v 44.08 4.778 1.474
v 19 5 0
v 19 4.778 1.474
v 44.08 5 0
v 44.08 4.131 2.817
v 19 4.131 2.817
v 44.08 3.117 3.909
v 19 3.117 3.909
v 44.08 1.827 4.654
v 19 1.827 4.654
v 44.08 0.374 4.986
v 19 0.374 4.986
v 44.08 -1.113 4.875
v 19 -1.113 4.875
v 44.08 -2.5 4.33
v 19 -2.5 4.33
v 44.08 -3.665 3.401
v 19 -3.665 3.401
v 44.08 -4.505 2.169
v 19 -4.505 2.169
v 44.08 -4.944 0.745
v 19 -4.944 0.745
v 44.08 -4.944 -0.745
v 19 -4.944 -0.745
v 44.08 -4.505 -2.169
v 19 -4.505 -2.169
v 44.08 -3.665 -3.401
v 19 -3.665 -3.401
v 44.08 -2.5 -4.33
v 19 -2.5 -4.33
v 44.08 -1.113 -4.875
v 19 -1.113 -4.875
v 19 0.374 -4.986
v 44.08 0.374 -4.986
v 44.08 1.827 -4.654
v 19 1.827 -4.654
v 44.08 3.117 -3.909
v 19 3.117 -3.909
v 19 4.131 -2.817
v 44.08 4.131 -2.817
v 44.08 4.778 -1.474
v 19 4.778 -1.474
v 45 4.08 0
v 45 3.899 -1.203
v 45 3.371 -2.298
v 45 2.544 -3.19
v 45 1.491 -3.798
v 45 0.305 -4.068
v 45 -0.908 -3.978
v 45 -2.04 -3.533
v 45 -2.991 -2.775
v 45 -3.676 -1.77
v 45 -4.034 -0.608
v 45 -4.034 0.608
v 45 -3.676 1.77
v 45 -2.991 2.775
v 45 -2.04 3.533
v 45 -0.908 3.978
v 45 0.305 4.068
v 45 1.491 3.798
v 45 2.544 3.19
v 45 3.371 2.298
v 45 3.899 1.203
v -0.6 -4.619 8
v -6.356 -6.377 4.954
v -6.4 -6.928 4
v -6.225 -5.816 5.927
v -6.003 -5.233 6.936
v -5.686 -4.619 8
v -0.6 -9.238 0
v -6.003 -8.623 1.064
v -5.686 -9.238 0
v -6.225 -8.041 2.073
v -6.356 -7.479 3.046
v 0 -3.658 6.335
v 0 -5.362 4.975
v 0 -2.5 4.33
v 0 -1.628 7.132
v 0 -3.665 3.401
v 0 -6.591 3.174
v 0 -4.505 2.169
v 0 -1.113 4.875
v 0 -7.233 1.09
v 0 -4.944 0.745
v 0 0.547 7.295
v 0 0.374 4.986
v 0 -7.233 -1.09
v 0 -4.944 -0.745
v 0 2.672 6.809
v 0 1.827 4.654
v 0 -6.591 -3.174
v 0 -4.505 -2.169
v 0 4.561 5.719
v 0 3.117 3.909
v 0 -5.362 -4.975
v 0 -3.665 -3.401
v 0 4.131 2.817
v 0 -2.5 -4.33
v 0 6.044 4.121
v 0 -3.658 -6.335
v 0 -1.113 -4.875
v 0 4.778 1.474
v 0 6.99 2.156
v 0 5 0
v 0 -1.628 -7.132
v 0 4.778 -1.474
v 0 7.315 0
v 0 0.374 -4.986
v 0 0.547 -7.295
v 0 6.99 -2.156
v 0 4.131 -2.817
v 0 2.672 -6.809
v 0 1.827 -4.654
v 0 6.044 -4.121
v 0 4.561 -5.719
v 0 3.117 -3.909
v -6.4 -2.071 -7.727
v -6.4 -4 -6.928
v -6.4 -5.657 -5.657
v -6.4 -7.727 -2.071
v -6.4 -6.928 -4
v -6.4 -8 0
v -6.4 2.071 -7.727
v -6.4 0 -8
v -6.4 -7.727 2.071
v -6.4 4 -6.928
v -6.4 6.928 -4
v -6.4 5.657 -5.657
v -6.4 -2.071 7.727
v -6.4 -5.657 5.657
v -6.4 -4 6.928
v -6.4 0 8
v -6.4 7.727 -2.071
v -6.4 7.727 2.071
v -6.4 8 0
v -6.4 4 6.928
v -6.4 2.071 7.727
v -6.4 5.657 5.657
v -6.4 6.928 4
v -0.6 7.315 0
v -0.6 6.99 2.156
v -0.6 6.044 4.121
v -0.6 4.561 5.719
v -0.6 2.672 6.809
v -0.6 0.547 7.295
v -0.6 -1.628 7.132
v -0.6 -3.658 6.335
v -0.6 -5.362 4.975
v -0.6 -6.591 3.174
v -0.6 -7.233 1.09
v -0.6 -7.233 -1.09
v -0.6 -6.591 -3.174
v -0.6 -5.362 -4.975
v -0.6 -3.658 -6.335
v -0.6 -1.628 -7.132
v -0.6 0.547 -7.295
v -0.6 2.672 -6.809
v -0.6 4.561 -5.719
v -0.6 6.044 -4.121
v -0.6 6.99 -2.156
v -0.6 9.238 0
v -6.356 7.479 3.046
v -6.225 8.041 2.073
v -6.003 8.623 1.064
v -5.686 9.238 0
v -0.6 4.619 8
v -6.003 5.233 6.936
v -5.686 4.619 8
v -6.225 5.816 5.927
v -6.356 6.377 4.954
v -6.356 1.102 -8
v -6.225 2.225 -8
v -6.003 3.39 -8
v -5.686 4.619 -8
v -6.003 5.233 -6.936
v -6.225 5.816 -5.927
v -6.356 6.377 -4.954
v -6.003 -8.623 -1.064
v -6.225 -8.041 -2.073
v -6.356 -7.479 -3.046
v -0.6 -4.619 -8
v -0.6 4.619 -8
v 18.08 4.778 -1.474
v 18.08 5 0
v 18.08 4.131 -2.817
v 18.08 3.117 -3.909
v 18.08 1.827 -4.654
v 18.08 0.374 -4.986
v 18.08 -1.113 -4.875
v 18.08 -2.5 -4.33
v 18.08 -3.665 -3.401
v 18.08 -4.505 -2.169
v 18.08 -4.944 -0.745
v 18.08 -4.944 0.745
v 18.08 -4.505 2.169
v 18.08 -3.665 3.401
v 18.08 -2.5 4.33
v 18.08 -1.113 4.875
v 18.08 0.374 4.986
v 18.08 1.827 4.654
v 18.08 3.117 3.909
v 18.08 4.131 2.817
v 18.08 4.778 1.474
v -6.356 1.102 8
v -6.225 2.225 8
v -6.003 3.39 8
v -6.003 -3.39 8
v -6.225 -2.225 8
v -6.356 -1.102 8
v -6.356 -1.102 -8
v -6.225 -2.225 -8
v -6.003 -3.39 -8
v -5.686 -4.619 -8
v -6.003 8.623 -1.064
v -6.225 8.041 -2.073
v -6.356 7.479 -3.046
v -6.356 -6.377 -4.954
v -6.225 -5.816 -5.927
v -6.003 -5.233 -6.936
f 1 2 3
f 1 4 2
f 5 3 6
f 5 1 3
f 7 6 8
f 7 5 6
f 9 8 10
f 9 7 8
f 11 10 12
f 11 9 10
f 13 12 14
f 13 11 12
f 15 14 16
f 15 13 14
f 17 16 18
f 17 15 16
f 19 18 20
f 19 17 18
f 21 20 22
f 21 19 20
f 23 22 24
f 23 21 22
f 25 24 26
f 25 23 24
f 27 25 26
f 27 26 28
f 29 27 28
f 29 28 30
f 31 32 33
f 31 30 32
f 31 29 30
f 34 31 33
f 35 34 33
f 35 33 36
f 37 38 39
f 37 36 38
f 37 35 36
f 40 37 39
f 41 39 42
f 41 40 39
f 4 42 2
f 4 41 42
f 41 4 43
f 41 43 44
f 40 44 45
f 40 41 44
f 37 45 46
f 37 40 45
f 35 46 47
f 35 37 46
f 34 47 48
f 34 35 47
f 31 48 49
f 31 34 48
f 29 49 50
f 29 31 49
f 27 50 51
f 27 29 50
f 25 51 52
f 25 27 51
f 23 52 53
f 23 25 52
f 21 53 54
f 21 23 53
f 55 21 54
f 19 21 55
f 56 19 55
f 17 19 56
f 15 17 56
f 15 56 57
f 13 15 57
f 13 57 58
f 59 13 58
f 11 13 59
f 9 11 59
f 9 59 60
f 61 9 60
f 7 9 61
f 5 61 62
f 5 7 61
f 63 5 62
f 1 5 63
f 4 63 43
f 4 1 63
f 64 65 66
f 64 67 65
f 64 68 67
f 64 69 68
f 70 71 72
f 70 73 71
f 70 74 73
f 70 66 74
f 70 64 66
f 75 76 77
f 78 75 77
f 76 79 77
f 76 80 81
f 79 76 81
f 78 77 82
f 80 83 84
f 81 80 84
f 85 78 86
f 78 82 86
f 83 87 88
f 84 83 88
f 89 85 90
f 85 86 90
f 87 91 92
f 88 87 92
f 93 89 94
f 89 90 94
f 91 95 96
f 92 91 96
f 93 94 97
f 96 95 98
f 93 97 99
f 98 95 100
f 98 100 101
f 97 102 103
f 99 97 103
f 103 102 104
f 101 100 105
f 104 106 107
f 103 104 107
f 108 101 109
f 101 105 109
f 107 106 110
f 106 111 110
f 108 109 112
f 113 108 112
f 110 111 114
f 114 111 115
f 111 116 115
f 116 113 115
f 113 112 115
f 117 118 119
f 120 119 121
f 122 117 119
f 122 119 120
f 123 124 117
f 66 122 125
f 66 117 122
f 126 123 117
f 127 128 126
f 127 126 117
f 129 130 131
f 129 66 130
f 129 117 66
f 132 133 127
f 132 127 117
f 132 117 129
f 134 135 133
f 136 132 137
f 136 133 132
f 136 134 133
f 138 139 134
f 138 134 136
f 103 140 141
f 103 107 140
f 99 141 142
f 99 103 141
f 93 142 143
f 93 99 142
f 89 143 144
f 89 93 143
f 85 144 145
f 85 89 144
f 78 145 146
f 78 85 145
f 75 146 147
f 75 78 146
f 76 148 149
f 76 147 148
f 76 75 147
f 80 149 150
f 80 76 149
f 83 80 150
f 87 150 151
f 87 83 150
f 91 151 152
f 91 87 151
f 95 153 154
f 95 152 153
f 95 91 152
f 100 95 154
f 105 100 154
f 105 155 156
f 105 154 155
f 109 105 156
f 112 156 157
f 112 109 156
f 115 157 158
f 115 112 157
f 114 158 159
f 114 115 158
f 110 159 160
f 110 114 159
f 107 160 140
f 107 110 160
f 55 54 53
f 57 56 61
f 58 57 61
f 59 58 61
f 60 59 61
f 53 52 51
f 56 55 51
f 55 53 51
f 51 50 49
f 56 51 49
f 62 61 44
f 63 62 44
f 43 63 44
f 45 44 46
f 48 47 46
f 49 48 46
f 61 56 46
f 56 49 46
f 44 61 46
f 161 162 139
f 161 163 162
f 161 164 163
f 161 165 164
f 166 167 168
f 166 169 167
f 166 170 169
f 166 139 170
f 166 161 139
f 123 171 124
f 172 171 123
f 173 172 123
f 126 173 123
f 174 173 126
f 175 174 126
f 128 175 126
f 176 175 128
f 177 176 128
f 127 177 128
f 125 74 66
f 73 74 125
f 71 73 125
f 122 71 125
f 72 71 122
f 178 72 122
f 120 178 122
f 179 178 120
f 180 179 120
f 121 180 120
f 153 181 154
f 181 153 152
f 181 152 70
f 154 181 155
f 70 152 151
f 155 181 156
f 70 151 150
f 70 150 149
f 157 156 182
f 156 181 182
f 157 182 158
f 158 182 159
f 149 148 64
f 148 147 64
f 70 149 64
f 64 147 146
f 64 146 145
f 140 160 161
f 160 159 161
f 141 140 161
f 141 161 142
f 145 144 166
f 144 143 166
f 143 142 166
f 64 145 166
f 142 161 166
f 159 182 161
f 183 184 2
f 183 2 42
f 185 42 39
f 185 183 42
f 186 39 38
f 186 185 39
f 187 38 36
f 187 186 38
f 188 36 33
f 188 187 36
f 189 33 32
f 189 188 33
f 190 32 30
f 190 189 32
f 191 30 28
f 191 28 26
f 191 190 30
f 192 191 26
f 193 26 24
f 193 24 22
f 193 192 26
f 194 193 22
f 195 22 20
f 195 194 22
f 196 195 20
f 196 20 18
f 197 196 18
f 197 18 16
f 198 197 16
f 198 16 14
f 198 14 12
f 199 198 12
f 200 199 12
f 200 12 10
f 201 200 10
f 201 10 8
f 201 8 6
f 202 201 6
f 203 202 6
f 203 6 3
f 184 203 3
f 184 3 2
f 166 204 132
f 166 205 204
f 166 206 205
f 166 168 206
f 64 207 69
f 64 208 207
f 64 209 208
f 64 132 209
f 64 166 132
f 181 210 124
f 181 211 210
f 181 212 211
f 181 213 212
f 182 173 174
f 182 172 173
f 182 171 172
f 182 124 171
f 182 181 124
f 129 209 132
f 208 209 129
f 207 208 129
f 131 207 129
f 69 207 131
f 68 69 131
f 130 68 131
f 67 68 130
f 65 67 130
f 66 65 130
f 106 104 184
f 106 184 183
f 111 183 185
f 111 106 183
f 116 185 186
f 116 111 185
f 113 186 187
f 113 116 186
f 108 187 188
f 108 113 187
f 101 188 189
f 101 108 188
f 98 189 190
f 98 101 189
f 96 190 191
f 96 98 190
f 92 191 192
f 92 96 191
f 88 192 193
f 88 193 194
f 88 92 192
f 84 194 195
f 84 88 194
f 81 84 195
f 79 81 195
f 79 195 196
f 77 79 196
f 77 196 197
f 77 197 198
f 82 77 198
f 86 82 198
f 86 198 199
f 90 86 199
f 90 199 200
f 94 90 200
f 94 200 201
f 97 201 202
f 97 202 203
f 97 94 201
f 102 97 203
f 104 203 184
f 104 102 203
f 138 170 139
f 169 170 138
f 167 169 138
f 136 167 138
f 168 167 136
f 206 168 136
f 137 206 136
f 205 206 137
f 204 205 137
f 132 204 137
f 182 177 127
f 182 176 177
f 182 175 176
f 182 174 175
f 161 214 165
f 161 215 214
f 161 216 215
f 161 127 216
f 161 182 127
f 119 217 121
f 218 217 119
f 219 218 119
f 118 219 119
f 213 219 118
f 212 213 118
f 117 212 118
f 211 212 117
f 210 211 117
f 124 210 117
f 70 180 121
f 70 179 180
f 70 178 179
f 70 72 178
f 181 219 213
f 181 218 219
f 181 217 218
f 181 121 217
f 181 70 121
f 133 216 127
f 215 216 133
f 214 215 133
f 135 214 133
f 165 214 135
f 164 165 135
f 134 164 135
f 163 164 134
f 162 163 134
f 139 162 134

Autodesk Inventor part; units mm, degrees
ref_plane "YZ Plane" through (0, 0, 0) normal (1, 0, 0) x (0, 1, 0)
ref_plane "XZ Plane" through (0, 0, 0) normal (0, 1, 0) x (-1, 0, 0)
sketch "Sketch1" plane through (0, 0, 0) normal (0, 0, 1) x (1, 0, 0)
  line L0 (0, 7.315) -> (0, 5)
  line L1 (19, 5) -> (45, 5)
  line L2 (45, 5) -> (45, 0)
  line L3 (45, 0) -> (-0.6001, 0)
  line L4 (-9.7201, 0) -> (54.12, 0) projected
  line L5 (-0.6001, 0) -> (-0.6001, 7.315)
  line L6 (-0.6001, 7.315) -> (0, 7.315)
  line L7 (19, 5) -> (18.0797, 5)
  line L8 (18.0797, 5) -> (0, 5)
  line L9 (0, -1.463) -> (0, 8.778) projected
  dimension "d0" = 45
  dimension "d1" = 26
  dimension "d2" = 10
  dimension "d9" = 0.6001
  dimension "d10" = 14.63
  dimension "d13" = 0.9203
  dimension "d14" = 10
revolve "Body" add sketch "Sketch1" angle 360 about axis through (45, 0, 0) along (-1, 0, 0)
sketch "Sketch2" plane through (-0.6001, 0, 0) normal (-1, 0, 0) x (0, 0, 1)
  line L0 (0, 9.2376) -> (8, 4.6188)
  line L1 (8, 4.6188) -> (8, -4.6188)
  line L2 (8, -4.6188) -> (0, -9.2376)
  line L3 (0, -9.2376) -> (-8, -4.6188)
  line L4 (-8, -4.6188) -> (-8, 4.6188)
  line L5 (-8, 4.6188) -> (0, 9.2376)
  point P0 (0, 0)
  point P1 (0, 0)
  dimension "d11" = 16
extrude "Head" add sketch "Sketch2" along normal blind 5.8
sketch "Sketch4" plane through (0, 0, 0) normal (0, 0, 1) x (1, 0, 0)
  line L0 (-6.4001, 8) -> (-6.4001, 9.2376)
  line L1 (-6.4001, 9.2376) -> (-5.6856, 9.2376)
  line L2 (-5.6856, 9.2376) -> (-6.4001, 8)
  line L3 (-7.5601, 0) -> (0.5599, 0) projected
  line L4 (-0.6001, 9.2376) -> (-6.4001, 9.2376) projected
  line L5 (-6.4001, 4.6188) -> (-6.4001, 9.2376) projected
  dimension "d5" = 30
  dimension "d19" = 16
revolve "Chamfer1" cut sketch "Sketch4" angle 360 about axis through (-10, 0, 0) along (1, 0, 0)
thread "Thread" size "M10x1.5" class "6g" standard "ISO Metric profile" length 26
chamfer "Chamfer2" distance 0.9202 distance2 0.9203 1 edges at (45, -5, 0) measured on face at (45, 1.2281, 0.495)
ref_plane "Work Plane1" through (1.525, 0, 0) normal (0, 0, 1) x (1, 0, 0)
equation "\"d0\" = NLG"
equation "\"d1\" = GEL"
equation "\"d2\" = GD"
equation "\"d10\" = SD2"
equation "\"d14\" = BDM"
equation "\"d11\" = SW"
equation "\"d3\" = KOH - SD"
equation "\"d5\" = ANG1"
equation "\"d19\" = SW0"
equation "\"d15\" = GEL"
equation "\"d6\" = -0.5 * SPD + 0.5 * GD"
equation "\"NLG\" = 45"
equation "\"GD\" = NND"
equation "\"BDM\" = NND"
equation "\"KOH\" = 6.4"
equation "\"GEL\" = 26"
equation "\"SW\" = 16"
equation "\"SW0\" = SW"
equation "\"SPD\" = NND - 1.2269 * PTC"
equation "\"SD2\" = 14.63"
equation "\"SD\" = 0.6"
equation "\"ANG1\" = 30deg"
equation "\"GAL\" = 0.61345 * PTC"
equation "\"GUL\" = 0.61345 * PTC"
equation "\"RR\" = 0.4"
equation "\"GD1\" = THREADDIA - 1.2269 * PTC"
equation "\"SDH\" = SD2"
equation "\"TOA\" = 30deg"
equation "\"PTC\" = 1.5"
equation "\"E0\" = 1.155 * SW"
equation "\"NND\" = 10"
equation "\"THREADDIA\" = 10"
properties part number "ISO 4014 - M10 x 45" material "Stainless Steel, 440C"
